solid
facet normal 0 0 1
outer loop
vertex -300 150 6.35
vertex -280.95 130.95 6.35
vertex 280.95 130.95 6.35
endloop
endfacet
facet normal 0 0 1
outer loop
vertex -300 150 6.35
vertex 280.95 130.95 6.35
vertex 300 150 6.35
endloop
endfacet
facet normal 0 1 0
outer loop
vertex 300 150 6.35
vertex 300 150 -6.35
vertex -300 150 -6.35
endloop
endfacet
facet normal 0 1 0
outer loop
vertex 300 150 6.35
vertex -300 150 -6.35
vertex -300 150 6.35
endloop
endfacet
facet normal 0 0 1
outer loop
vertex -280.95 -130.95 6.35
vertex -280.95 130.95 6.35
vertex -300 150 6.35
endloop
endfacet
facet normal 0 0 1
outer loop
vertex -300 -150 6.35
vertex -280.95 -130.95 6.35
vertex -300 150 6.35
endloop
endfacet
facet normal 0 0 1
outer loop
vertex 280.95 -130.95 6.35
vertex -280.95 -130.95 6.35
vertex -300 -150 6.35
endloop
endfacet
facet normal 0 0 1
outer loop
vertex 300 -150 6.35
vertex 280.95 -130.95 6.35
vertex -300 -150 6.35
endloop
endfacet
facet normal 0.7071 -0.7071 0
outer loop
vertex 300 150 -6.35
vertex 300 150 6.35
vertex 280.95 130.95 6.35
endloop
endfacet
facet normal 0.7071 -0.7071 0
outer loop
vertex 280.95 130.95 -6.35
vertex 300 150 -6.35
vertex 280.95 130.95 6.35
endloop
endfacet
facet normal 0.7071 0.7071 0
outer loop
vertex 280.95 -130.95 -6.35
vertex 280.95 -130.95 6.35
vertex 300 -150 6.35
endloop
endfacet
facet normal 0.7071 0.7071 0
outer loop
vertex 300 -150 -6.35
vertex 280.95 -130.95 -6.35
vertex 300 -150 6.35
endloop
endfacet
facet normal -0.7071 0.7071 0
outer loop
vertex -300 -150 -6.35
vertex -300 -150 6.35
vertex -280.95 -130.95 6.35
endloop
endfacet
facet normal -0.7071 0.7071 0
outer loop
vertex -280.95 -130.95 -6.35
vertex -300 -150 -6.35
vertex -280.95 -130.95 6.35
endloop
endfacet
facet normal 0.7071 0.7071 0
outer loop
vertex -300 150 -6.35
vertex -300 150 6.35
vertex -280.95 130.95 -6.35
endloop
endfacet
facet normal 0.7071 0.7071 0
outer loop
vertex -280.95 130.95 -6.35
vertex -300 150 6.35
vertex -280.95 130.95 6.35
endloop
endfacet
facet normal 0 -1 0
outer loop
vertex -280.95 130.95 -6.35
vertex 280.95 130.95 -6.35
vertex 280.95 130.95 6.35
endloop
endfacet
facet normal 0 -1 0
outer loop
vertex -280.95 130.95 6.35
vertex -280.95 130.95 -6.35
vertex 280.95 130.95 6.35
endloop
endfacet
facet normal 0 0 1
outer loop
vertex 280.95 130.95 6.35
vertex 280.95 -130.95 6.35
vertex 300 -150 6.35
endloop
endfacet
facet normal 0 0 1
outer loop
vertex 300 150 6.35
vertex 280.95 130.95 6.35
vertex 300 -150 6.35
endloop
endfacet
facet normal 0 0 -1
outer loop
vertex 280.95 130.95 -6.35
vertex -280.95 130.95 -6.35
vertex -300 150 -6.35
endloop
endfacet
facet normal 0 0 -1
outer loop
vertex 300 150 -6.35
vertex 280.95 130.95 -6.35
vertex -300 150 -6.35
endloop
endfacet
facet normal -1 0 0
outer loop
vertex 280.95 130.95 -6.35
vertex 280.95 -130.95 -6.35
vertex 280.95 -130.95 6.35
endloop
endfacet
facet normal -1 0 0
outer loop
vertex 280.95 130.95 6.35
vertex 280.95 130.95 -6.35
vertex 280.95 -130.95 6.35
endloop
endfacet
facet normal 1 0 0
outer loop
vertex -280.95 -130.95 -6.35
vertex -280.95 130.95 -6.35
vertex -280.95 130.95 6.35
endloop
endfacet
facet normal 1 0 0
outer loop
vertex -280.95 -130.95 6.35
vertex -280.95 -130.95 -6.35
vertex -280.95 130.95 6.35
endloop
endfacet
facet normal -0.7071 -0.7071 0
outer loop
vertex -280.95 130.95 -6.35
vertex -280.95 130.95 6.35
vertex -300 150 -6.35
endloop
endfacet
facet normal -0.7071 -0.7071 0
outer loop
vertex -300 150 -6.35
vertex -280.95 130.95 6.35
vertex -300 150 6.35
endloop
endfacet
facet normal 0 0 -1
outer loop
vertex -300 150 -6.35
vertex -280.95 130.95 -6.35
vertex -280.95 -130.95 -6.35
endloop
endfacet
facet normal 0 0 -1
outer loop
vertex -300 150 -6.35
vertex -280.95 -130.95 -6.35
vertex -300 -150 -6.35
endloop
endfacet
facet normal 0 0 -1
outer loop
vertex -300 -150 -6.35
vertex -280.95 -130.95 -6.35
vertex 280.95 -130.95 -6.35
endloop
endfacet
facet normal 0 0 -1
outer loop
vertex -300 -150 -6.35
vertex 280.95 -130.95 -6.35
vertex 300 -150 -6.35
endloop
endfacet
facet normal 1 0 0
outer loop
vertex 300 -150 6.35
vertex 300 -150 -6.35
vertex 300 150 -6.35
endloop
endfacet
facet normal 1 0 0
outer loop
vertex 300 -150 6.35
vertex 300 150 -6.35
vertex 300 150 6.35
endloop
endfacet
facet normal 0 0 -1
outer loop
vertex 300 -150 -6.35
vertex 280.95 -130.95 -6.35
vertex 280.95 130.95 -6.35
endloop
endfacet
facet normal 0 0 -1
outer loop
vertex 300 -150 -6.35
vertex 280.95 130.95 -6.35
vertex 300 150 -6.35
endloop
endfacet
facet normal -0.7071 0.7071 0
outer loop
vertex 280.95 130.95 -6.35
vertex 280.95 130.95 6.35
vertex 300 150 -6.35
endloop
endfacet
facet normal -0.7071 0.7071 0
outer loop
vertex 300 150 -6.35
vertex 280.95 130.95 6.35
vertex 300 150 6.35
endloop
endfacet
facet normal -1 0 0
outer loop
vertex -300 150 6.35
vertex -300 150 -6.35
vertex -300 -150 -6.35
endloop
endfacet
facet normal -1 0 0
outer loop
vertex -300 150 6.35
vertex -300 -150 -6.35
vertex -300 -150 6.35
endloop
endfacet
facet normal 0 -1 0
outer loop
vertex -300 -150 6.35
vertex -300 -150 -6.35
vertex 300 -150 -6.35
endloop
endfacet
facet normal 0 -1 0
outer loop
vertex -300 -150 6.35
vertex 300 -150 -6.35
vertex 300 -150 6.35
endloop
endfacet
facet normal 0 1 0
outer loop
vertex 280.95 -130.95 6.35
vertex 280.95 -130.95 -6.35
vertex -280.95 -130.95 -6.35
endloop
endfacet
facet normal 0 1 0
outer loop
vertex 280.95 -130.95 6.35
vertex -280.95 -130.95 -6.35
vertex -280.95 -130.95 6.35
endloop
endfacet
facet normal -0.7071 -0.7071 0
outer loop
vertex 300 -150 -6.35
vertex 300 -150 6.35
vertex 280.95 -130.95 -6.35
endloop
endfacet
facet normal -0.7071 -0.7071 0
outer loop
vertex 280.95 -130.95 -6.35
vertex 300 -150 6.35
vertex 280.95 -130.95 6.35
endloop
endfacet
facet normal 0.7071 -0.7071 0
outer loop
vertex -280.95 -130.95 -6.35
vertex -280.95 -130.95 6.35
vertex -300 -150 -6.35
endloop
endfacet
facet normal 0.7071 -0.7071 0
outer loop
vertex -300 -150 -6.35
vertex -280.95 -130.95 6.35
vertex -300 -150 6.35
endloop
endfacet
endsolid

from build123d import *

# Parameters (mm, degrees)
AL_SOLID_PROFILES_0_75_X_0_5_1_DEPTH      = 593.3976253
AL_SOLID_PROFILES_0_75_X_0_5_1_DEPTH_BACK = 12.4476253
CROQUIS18_W                               = 19.05
CROQUIS18_H                               = 12.7
CROQUIS18_ON_SEGMENT_2_W                  = 19.05
CROQUIS18_ON_SEGMENT_2_H                  = 12.7
AL_SOLID_PROFILES_0_75_X_0_5_1_2_DEPTH    = 305.845250599
CROQUIS18_ON_SEGMENT_3_W                  = 19.05
CROQUIS18_ON_SEGMENT_3_H                  = 12.7
AL_SOLID_PROFILES_0_75_X_0_5_1_3_DEPTH    = 605.845250599
CROQUIS18_ON_SEGMENT_4_W                  = 19.05
CROQUIS18_ON_SEGMENT_4_H                  = 12.7
AL_SOLID_PROFILES_0_75_X_0_5_1_4_DEPTH    = 305.845250599


with BuildPart() as part:
    # Croquis18 → Al solid profiles 0.75 X 0.5(1) (new, two sides: drawn at the far end of the back side and taken through both)
    with BuildSketch(Plane(origin=(290.475, -140.475, 0), x_dir=(0, -1, 0), z_dir=(-1, 0, 0)).offset(-AL_SOLID_PROFILES_0_75_X_0_5_1_DEPTH_BACK)):
        Rectangle(CROQUIS18_W, CROQUIS18_H)
    extrude(amount=AL_SOLID_PROFILES_0_75_X_0_5_1_DEPTH + AL_SOLID_PROFILES_0_75_X_0_5_1_DEPTH_BACK)

    # Al solid profiles 0.75 X 0.5(1) mitre 1
    split(bisect_by=Plane(origin=(290.475, -140.475, 0), x_dir=(0.707106781, -0.707106781, 0), z_dir=(-0.707106781, -0.707106781, 0)), keep=Keep.TOP)

    # Al solid profiles 0.75 X 0.5(1) mitre 2
    split(bisect_by=Plane(origin=(-290.475, -140.475, 0), x_dir=(0.707106781, 0.707106781, 0), z_dir=(0.707106781, -0.707106781, 0)), keep=Keep.TOP)


with BuildPart() as body_2:
    # Croquis18 on segment 2 (carried to segment 2) → Al solid profiles 0.75 X 0.5_1 2 (new body)
    with BuildSketch(Plane(origin=(-290.475, -152.9226253, 0), x_dir=(-1, 0, 0), z_dir=(0, 1, 0))):
        Rectangle(CROQUIS18_ON_SEGMENT_2_W, CROQUIS18_ON_SEGMENT_2_H)
    extrude(amount=AL_SOLID_PROFILES_0_75_X_0_5_1_2_DEPTH)

    # Al solid profiles 0.75 X 0.5_1 2 mitre 1
    split(bisect_by=Plane(origin=(-290.475, 140.475, 0), x_dir=(0.707106781, -0.707106781, 0), z_dir=(-0.707106781, -0.707106781, 0)), keep=Keep.TOP)

    # Al solid profiles 0.75 X 0.5_1 2 mitre 2
    split(bisect_by=Plane(origin=(-290.475, -140.475, 0), x_dir=(-0.707106781, -0.707106781, 0), z_dir=(-0.707106781, 0.707106781, 0)), keep=Keep.TOP)


with BuildPart() as body_3:
    # Croquis18 on segment 3 (carried to segment 3) → Al solid profiles 0.75 X 0.5_1 3 (new body)
    with BuildSketch(Plane(origin=(-302.9226253, 140.475, 0), x_dir=(0, 1, 0), z_dir=(1, 0, 0))):
        Rectangle(CROQUIS18_ON_SEGMENT_3_W, CROQUIS18_ON_SEGMENT_3_H)
    extrude(amount=AL_SOLID_PROFILES_0_75_X_0_5_1_3_DEPTH)

    # Al solid profiles 0.75 X 0.5_1 3 mitre 1
    split(bisect_by=Plane(origin=(290.475, 140.475, 0), x_dir=(-0.707106781, -0.707106781, 0), z_dir=(-0.707106781, 0.707106781, 0)), keep=Keep.TOP)

    # Al solid profiles 0.75 X 0.5_1 3 mitre 2
    split(bisect_by=Plane(origin=(-290.475, 140.475, 0), x_dir=(-0.707106781, 0.707106781, 0), z_dir=(0.707106781, 0.707106781, 0)), keep=Keep.TOP)


with BuildPart() as body_4:
    # Croquis18 on segment 4 (carried to segment 4) → Al solid profiles 0.75 X 0.5_1 4 (new body)
    with BuildSketch(Plane(origin=(290.475, 152.9226253, 0), x_dir=(1, 0, 0), z_dir=(0, -1, 0))):
        Rectangle(CROQUIS18_ON_SEGMENT_4_W, CROQUIS18_ON_SEGMENT_4_H)
    extrude(amount=AL_SOLID_PROFILES_0_75_X_0_5_1_4_DEPTH)

    # Al solid profiles 0.75 X 0.5_1 4 mitre 1
    split(bisect_by=Plane(origin=(290.475, 140.475, 0), x_dir=(0.707106781, 0.707106781, 0), z_dir=(0.707106781, -0.707106781, 0)), keep=Keep.TOP)

    # Al solid profiles 0.75 X 0.5_1 4 mitre 2
    split(bisect_by=Plane(origin=(290.475, -140.475, 0), x_dir=(-0.707106781, 0.707106781, 0), z_dir=(0.707106781, 0.707106781, 0)), keep=Keep.TOP)


solid = Compound([part.part, body_2.part, body_3.part, body_4.part])
